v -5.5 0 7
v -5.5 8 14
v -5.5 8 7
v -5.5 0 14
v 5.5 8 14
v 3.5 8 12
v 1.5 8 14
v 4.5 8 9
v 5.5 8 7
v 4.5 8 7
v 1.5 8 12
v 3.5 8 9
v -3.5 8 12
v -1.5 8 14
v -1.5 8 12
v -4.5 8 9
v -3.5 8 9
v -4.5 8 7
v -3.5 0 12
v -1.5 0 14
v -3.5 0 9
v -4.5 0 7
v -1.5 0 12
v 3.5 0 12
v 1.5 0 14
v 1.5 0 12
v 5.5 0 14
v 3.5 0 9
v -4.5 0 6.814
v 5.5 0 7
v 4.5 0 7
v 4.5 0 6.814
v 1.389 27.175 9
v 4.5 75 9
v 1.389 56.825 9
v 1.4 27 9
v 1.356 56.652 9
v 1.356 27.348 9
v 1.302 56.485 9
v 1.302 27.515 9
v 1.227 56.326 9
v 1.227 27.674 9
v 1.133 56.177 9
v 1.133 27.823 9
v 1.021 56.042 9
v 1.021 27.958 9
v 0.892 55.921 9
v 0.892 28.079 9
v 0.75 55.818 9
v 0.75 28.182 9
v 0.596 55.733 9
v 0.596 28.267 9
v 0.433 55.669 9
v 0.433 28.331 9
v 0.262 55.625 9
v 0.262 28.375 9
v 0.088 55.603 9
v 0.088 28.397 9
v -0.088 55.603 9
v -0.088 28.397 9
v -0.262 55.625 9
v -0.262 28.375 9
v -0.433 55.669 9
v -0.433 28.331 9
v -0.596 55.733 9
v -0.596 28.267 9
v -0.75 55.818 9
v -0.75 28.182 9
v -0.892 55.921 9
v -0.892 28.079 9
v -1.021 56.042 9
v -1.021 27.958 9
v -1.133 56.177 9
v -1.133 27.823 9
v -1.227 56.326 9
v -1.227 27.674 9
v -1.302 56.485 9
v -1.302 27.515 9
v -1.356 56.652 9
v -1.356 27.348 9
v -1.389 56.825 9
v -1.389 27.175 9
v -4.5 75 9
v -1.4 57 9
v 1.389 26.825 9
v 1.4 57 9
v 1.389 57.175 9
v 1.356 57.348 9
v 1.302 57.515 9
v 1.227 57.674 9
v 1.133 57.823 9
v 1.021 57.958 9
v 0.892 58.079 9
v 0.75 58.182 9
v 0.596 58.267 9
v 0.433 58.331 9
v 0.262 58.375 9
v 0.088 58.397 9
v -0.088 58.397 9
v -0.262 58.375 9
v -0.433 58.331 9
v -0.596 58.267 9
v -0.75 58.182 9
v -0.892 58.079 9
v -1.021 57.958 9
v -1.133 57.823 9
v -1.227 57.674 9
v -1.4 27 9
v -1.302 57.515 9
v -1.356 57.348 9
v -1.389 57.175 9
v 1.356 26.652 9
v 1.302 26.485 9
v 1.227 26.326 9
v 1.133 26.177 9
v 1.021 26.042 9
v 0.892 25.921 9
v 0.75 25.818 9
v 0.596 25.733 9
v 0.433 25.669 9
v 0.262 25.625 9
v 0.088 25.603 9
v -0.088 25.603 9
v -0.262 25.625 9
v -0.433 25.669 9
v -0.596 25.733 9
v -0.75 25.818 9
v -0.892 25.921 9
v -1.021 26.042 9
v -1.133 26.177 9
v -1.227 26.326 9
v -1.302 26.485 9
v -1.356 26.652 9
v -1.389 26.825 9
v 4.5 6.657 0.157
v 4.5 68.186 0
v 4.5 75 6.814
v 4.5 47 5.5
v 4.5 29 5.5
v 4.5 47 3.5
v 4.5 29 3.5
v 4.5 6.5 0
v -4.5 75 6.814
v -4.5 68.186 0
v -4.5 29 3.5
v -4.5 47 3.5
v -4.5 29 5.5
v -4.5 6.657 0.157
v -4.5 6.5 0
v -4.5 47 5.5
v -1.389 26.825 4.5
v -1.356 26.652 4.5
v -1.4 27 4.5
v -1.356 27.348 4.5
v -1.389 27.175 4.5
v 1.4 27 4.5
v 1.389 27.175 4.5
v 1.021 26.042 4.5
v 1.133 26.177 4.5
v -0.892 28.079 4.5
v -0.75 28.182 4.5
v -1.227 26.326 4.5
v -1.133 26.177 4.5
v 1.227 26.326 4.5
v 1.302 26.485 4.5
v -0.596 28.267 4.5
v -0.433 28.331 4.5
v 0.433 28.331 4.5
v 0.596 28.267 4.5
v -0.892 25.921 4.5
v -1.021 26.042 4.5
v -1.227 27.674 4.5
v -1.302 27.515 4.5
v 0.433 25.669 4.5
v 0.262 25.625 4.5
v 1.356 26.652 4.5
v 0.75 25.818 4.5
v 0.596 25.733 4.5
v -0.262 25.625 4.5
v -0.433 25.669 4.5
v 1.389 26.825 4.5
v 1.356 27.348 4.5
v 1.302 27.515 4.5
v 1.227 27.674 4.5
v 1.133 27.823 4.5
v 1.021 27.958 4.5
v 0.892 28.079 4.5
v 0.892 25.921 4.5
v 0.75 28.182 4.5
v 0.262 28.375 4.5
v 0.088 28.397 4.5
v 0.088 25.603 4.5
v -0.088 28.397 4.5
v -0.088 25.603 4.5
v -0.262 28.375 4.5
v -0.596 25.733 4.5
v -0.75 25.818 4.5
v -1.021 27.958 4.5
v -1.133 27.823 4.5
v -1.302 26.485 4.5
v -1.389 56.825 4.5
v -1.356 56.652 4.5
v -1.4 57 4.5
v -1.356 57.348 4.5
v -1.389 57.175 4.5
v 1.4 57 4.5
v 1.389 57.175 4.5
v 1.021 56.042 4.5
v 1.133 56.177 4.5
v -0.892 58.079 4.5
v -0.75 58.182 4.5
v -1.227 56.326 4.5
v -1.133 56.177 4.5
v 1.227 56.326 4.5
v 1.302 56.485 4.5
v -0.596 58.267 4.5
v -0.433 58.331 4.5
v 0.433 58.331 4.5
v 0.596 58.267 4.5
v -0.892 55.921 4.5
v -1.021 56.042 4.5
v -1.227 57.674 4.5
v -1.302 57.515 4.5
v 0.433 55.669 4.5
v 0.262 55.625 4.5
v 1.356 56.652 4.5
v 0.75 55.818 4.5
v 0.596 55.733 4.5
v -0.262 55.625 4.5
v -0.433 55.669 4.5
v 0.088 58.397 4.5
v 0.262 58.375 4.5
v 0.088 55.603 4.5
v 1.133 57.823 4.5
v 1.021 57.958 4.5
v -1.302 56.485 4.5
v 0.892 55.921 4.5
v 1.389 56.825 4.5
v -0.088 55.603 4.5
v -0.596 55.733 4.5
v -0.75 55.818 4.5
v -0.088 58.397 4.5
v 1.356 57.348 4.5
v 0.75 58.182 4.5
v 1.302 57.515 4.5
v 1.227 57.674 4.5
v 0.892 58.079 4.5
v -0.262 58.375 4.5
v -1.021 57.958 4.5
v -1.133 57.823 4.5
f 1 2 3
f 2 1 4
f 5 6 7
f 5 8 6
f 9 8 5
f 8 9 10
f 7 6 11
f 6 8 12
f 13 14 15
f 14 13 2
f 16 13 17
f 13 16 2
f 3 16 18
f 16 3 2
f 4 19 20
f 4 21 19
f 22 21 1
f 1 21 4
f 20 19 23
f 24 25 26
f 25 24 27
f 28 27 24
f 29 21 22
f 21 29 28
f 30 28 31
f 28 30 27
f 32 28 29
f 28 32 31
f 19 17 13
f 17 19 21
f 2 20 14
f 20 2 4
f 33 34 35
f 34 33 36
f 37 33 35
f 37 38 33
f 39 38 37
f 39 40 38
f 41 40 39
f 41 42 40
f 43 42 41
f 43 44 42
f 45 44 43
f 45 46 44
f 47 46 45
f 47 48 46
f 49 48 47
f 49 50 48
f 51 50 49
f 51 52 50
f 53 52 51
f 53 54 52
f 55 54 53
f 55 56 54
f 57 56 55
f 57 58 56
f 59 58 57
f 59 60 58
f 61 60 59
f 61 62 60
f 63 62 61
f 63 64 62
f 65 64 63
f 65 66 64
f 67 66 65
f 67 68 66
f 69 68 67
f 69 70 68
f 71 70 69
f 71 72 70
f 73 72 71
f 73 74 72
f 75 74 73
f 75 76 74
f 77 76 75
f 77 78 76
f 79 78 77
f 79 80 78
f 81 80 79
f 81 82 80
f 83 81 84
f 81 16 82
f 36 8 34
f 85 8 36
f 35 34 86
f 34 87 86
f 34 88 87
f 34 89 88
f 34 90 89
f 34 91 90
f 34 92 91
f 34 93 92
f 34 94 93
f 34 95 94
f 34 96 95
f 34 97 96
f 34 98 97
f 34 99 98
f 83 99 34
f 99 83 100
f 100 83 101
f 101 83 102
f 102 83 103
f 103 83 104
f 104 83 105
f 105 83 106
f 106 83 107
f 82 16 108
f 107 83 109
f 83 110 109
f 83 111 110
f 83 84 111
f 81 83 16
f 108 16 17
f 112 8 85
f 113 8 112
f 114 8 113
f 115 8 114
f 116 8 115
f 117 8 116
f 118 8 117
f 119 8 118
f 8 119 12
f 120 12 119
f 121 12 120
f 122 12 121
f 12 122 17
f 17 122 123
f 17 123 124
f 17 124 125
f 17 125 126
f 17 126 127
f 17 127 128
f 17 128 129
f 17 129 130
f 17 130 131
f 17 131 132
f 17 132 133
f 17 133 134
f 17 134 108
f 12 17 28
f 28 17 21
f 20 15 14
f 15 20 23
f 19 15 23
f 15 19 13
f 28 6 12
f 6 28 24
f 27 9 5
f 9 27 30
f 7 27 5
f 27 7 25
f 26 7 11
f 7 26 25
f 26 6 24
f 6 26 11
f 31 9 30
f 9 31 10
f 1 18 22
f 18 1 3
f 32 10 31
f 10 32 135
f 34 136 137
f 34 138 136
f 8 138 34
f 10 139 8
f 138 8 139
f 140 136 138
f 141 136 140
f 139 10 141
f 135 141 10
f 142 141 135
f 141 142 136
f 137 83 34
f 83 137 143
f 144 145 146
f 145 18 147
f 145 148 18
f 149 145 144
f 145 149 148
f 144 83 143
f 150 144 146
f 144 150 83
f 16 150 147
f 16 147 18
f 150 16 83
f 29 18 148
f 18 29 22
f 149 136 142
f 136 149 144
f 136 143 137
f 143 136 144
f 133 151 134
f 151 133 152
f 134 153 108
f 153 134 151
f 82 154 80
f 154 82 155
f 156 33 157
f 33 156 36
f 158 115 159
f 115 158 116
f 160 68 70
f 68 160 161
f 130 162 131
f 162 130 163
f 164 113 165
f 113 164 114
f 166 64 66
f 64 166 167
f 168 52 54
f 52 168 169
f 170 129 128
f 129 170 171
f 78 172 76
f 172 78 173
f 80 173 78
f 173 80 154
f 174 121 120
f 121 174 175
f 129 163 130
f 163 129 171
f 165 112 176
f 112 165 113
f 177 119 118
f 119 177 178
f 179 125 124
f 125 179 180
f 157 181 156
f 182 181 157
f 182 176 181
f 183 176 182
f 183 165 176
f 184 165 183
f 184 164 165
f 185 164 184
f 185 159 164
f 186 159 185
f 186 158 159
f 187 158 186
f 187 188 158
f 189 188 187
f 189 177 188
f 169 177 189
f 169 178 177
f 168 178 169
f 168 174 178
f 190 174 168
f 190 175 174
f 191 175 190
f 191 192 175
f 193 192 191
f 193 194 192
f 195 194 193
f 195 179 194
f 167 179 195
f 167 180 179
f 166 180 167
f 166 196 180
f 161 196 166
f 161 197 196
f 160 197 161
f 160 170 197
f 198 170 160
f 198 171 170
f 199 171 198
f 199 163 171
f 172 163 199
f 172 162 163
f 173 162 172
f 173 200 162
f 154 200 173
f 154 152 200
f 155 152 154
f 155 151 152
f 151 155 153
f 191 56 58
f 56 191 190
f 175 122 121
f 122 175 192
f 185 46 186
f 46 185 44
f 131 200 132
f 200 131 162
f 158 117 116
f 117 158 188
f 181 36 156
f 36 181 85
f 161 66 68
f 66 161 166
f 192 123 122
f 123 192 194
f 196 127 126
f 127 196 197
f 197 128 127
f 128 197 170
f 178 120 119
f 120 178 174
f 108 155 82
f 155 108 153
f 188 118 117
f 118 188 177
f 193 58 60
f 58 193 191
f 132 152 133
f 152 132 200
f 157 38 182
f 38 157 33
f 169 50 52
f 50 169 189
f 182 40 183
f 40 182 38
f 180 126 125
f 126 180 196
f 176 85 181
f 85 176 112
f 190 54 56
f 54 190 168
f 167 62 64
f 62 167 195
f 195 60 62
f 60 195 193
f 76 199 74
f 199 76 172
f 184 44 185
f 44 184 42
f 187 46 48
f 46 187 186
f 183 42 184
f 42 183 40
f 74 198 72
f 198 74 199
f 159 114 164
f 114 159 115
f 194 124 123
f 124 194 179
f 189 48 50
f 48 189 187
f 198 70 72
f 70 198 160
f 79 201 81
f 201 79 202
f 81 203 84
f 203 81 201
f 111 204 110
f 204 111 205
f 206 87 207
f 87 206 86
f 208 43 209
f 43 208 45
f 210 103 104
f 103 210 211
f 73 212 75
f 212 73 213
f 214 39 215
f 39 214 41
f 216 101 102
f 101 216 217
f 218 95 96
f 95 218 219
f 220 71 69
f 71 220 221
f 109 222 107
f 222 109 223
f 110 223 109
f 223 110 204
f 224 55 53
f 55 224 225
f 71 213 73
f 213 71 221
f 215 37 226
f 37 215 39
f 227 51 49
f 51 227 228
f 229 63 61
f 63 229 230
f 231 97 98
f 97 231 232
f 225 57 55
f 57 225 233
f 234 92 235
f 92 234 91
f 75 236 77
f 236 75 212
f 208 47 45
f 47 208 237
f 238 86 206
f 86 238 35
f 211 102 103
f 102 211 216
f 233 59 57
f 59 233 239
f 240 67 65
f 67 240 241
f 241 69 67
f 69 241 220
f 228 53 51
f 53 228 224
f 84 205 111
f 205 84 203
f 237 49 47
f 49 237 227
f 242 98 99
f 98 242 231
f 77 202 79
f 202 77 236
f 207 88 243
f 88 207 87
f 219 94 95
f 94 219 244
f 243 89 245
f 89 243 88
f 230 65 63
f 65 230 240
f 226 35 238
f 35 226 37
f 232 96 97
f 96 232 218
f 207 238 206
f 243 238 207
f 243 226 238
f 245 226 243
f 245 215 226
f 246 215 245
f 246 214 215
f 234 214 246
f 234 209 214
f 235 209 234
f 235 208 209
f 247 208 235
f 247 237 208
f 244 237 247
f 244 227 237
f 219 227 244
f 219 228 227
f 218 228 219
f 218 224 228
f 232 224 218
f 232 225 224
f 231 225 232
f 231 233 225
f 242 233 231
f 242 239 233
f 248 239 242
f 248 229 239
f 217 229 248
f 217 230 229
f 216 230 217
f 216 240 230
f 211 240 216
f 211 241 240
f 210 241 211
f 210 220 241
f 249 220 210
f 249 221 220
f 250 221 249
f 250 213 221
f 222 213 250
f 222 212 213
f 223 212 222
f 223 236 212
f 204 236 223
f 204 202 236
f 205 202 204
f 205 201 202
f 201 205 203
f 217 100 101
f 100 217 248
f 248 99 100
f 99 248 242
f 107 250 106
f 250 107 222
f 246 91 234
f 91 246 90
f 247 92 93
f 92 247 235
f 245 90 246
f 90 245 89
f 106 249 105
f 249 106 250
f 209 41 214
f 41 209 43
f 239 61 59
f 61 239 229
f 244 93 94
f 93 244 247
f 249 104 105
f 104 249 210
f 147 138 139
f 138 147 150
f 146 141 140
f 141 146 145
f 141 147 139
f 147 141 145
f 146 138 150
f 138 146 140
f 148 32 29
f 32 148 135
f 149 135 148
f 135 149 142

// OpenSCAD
$fn=50;

KEEL_W=9.0;
KEEL_H=9.0;
KEEL_L=75;

module cable_clamp(y_position) {
    translate([1.5, y_position, 4.5]) {
        rotate([90, 0, 0]) {
            union() {
                // Vertical arm of the C-clamp 2
                translate([2.0, 0, 0]) cube([2, 5, 8]);
                // Horizontal arm of the C-clamp
                rotate([90, 0, 0])
                translate([0, 0, -5]) cube([2, 8, 2]);
                // Vertical arm of the C-clamp 1
                translate([-7, 0, 0]) cube([2, 5, 8]);
                // Horizontal arm of the C-clamp
                rotate([90, 0, 0])
                translate([-5.0, 0,-5]) cube([2, 8, 2]);
                // clamp bed
                rotate([90, 0, 0])
                translate([-7.0, 0,-0]) cube([11, 8, 2]);
            }
        }
    }
}

module cutout_group(y_position) {
    translate([0, y_position, 0]) {
        
        // front of keel slope
        translate([-5, -KEEL_L-1, -3])
        rotate([-45, 0, 0])
        //(x, z, y)
        cube([10, 11, 8]); 

        //center cutout - vent
        //translate([-1.0, -42.0, -5.0])
        //rotate([90,0,0])
        //y, z, x
        //cube([1.5, 10, 25]);

        // screw holes
        translate([0, -22, 0]) cylinder(h=5, d=2.8); 
        translate([0.0, -52, 0]) cylinder(h=5, d=2.8);   

        // thru slots for straps
        translate([-7.0, -42,-1]) cube([14, 18, 2]);       
        //translate([-7.0, -92,-1]) cube([14, 18, 2]);
        
    }
}

// translate and rotate so model starts at 0, 0, 0
// someone tell me why this has to be done by hand?
translate([0, 0, KEEL_H/2]) {
    rotate([180, 180, 0]) { // Flipping the entire object along the Y axis
        difference() {
            union() {           
                // keel
                rotate([90,0,0])
                linear_extrude(KEEL_L) square([KEEL_W, KEEL_H], center=true); 
                // cable clamp
                cable_clamp(0);
                // measuring posts
                //translate([0,  MOUNT_HOLE_OFFSET+15, 0]) cylinder(h=7, d=1.0);            
                //translate([0, MOUNT_HOLE_OFFSET+30, 0]) cylinder(h=7, d=1.0);
            }
            
            cutout_group(-5);
            
            // rear of keel slope
            translate([-5, -1, -10])
            rotate([45, 0, 0])
            //(x, z, y)
            cube([10, 11, 8]);  
        }
    }
}
